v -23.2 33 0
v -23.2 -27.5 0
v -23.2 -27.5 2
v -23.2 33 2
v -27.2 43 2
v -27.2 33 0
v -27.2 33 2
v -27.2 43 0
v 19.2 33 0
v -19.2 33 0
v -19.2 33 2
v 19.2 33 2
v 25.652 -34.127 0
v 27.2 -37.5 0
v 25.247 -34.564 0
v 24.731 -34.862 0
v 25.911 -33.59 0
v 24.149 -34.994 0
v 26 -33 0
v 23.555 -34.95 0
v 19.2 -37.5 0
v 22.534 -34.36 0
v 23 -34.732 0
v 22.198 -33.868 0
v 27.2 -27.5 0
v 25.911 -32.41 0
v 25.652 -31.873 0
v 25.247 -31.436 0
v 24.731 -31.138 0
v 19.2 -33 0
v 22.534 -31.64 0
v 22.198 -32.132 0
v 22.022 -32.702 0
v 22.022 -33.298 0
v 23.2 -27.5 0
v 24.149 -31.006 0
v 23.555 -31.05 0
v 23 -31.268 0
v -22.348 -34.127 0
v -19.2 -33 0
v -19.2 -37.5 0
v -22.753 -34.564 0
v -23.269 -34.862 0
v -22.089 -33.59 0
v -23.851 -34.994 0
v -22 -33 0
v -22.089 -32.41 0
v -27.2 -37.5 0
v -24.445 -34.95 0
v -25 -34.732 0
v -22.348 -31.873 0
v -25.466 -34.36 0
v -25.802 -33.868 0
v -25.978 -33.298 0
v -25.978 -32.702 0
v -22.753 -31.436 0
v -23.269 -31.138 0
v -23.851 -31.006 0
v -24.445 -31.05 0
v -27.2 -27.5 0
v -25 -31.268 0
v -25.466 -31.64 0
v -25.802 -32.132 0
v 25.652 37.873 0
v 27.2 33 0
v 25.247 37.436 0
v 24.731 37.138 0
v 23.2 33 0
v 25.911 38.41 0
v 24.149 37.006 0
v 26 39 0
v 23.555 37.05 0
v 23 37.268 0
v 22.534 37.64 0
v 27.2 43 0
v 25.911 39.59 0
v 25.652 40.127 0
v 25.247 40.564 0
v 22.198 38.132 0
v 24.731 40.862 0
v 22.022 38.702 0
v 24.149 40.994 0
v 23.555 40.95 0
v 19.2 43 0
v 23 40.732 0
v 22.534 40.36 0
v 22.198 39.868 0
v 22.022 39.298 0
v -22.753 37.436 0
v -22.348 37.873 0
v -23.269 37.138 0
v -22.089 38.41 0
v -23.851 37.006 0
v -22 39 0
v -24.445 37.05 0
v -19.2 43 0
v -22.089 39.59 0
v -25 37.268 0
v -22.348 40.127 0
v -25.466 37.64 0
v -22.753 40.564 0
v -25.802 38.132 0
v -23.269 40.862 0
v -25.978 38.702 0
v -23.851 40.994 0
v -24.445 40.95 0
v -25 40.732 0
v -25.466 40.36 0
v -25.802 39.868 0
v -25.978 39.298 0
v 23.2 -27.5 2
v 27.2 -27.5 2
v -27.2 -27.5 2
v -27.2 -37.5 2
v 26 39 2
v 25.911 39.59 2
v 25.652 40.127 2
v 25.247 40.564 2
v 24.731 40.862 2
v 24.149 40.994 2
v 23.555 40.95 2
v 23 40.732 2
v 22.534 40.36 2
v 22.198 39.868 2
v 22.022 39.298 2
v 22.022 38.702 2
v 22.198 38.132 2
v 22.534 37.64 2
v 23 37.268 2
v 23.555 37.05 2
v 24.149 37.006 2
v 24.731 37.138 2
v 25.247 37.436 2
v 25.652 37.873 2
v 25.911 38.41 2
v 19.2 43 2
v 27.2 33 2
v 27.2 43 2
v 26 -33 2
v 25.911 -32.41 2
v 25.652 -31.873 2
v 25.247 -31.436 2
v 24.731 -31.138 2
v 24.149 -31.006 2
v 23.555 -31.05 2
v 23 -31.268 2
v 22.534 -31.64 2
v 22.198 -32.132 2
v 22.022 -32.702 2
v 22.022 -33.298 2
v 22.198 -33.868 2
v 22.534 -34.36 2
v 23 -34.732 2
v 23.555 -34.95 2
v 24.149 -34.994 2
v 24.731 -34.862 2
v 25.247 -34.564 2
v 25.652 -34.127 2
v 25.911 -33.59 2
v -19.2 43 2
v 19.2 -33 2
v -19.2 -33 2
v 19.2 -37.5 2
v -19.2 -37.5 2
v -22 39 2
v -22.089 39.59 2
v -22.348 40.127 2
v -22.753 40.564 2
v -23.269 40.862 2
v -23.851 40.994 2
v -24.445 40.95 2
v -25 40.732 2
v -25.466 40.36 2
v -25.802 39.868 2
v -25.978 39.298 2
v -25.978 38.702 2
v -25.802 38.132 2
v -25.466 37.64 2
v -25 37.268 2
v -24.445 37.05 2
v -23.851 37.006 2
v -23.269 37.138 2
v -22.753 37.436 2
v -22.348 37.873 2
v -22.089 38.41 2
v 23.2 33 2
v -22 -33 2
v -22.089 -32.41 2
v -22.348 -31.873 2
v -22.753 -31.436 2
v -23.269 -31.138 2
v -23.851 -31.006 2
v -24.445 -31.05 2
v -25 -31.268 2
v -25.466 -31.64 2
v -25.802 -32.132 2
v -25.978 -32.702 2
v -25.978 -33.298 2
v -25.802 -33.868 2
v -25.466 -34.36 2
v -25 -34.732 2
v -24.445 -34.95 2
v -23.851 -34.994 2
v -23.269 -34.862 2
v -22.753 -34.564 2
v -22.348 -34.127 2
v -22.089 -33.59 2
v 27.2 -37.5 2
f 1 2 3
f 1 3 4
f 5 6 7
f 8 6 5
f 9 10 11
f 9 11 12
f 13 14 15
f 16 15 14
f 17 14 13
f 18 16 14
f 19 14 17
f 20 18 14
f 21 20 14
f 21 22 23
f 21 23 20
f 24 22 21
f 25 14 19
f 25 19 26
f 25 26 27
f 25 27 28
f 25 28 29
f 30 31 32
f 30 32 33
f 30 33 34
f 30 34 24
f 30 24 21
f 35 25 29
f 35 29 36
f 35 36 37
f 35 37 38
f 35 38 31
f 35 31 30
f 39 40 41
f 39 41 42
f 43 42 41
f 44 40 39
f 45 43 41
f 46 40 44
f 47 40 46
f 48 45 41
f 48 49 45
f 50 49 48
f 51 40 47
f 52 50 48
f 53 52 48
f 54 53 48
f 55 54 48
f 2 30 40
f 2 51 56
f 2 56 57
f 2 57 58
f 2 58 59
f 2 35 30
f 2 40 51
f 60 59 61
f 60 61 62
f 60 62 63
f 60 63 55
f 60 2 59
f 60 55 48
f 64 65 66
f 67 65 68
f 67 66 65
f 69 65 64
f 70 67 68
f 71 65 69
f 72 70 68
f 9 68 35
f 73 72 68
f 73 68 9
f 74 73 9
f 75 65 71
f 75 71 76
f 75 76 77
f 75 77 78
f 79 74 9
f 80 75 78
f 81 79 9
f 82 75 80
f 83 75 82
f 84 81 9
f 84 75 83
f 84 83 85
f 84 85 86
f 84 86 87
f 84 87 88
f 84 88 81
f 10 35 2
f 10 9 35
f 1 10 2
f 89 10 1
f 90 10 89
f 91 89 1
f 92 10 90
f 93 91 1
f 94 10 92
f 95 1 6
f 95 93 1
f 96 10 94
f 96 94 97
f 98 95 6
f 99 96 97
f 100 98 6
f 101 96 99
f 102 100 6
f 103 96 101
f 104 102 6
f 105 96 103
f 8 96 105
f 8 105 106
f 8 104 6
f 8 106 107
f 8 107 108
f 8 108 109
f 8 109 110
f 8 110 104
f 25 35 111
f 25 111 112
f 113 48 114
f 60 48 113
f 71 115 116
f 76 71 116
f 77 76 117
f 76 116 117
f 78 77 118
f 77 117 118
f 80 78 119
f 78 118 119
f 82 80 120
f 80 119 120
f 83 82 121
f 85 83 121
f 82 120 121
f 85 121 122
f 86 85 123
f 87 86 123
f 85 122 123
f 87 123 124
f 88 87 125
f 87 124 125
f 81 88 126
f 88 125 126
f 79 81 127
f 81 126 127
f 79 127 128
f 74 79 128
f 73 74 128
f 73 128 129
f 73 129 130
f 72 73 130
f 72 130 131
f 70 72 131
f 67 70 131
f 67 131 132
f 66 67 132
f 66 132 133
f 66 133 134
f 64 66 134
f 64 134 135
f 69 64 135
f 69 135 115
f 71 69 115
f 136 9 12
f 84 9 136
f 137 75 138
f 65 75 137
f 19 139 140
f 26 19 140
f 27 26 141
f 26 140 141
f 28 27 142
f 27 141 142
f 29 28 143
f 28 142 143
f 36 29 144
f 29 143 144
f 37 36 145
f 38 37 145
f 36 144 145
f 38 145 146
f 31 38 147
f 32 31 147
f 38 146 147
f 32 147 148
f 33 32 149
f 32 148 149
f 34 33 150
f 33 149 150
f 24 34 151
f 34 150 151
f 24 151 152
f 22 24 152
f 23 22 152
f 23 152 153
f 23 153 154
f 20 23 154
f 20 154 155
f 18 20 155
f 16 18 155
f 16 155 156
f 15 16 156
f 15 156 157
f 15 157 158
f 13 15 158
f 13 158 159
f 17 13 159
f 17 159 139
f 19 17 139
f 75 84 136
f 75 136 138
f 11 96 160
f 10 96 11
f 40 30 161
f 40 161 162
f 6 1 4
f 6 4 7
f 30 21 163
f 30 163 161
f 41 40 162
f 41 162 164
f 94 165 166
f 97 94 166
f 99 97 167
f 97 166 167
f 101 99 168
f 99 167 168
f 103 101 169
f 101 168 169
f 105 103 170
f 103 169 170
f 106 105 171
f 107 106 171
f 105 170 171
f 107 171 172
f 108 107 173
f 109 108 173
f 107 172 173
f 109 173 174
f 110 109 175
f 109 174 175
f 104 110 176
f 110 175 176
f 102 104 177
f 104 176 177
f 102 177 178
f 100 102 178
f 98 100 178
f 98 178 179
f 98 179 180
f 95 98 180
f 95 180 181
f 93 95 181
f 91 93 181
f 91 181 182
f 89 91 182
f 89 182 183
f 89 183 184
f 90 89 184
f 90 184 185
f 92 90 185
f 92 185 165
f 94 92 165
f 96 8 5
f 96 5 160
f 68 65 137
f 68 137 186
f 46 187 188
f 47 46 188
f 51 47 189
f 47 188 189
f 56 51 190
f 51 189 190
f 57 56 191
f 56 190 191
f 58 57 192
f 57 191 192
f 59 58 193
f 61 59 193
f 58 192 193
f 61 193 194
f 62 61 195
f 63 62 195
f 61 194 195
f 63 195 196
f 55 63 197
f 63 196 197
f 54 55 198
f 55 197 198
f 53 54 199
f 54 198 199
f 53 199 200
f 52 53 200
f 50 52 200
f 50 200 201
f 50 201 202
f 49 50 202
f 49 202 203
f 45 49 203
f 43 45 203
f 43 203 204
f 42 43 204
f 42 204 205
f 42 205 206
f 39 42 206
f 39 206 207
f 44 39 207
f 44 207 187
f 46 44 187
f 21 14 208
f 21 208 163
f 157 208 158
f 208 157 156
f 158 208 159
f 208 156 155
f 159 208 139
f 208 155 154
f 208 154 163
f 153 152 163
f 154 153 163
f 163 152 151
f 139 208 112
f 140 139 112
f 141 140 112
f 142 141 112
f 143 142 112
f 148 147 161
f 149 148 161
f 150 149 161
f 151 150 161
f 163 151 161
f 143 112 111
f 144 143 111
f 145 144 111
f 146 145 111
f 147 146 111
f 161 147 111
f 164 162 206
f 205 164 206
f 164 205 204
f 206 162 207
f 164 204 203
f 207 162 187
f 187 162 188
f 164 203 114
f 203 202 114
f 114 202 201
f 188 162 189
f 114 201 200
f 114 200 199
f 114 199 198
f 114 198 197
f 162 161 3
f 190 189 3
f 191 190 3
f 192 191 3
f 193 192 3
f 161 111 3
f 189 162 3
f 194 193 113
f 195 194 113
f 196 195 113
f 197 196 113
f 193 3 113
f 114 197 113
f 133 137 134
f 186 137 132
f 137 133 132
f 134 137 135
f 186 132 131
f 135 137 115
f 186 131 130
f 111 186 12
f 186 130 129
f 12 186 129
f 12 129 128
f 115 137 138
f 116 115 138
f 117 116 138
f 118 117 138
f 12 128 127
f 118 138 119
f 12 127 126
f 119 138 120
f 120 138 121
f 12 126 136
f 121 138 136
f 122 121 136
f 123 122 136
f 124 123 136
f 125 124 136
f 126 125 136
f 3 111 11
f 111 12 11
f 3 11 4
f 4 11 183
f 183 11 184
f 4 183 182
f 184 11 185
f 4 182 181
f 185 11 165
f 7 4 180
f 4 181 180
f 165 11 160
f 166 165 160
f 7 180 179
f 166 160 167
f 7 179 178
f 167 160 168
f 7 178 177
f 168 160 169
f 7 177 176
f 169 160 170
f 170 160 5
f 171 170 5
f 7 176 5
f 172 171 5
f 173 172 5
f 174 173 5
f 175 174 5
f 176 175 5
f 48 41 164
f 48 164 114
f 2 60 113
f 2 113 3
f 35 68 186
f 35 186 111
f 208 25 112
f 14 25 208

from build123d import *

# Parameters (mm, degrees)
EXTRUSION1_DEPTH        = 2
ESQUISSE2_R             = 2
ENL_V_MAT_EXTRU_1_DEPTH = 3


with BuildPart() as part:
    # Esquisse1 → Extrusion1 (new body)
    with BuildSketch(Plane.XY):
        Polygon((-19.2, 33), (19.2, 33), (19.2, 43), (27.2, 43), (27.2, 33), (23.2, 33), (23.2, -27.5), (27.2, -27.5), (27.2, -37.5), (19.2, -37.5), (19.2, -33), (-19.2, -33), (-19.2, -37.5), (-27.2, -37.5), (-27.2, -27.5), (-23.2, -27.5), (-23.2, 33), (-27.2, 33), (-27.2, 43), (-19.2, 43), align=None)
    extrude(amount=EXTRUSION1_DEPTH)

    # Esquisse2 → Enlèv. mat.-Extru.1 (cut, through all)
    with BuildSketch(Plane.XY.offset(2)):
        with Locations((-24, 39)):
            Circle(ESQUISSE2_R)
        with Locations((24, 39)):
            Circle(ESQUISSE2_R)
        with Locations((-24, -33)):
            Circle(ESQUISSE2_R)
        with Locations((24, -33)):
            Circle(ESQUISSE2_R)
    extrude(amount=-ENL_V_MAT_EXTRU_1_DEPTH, mode=Mode.SUBTRACT)


solid = part.part
